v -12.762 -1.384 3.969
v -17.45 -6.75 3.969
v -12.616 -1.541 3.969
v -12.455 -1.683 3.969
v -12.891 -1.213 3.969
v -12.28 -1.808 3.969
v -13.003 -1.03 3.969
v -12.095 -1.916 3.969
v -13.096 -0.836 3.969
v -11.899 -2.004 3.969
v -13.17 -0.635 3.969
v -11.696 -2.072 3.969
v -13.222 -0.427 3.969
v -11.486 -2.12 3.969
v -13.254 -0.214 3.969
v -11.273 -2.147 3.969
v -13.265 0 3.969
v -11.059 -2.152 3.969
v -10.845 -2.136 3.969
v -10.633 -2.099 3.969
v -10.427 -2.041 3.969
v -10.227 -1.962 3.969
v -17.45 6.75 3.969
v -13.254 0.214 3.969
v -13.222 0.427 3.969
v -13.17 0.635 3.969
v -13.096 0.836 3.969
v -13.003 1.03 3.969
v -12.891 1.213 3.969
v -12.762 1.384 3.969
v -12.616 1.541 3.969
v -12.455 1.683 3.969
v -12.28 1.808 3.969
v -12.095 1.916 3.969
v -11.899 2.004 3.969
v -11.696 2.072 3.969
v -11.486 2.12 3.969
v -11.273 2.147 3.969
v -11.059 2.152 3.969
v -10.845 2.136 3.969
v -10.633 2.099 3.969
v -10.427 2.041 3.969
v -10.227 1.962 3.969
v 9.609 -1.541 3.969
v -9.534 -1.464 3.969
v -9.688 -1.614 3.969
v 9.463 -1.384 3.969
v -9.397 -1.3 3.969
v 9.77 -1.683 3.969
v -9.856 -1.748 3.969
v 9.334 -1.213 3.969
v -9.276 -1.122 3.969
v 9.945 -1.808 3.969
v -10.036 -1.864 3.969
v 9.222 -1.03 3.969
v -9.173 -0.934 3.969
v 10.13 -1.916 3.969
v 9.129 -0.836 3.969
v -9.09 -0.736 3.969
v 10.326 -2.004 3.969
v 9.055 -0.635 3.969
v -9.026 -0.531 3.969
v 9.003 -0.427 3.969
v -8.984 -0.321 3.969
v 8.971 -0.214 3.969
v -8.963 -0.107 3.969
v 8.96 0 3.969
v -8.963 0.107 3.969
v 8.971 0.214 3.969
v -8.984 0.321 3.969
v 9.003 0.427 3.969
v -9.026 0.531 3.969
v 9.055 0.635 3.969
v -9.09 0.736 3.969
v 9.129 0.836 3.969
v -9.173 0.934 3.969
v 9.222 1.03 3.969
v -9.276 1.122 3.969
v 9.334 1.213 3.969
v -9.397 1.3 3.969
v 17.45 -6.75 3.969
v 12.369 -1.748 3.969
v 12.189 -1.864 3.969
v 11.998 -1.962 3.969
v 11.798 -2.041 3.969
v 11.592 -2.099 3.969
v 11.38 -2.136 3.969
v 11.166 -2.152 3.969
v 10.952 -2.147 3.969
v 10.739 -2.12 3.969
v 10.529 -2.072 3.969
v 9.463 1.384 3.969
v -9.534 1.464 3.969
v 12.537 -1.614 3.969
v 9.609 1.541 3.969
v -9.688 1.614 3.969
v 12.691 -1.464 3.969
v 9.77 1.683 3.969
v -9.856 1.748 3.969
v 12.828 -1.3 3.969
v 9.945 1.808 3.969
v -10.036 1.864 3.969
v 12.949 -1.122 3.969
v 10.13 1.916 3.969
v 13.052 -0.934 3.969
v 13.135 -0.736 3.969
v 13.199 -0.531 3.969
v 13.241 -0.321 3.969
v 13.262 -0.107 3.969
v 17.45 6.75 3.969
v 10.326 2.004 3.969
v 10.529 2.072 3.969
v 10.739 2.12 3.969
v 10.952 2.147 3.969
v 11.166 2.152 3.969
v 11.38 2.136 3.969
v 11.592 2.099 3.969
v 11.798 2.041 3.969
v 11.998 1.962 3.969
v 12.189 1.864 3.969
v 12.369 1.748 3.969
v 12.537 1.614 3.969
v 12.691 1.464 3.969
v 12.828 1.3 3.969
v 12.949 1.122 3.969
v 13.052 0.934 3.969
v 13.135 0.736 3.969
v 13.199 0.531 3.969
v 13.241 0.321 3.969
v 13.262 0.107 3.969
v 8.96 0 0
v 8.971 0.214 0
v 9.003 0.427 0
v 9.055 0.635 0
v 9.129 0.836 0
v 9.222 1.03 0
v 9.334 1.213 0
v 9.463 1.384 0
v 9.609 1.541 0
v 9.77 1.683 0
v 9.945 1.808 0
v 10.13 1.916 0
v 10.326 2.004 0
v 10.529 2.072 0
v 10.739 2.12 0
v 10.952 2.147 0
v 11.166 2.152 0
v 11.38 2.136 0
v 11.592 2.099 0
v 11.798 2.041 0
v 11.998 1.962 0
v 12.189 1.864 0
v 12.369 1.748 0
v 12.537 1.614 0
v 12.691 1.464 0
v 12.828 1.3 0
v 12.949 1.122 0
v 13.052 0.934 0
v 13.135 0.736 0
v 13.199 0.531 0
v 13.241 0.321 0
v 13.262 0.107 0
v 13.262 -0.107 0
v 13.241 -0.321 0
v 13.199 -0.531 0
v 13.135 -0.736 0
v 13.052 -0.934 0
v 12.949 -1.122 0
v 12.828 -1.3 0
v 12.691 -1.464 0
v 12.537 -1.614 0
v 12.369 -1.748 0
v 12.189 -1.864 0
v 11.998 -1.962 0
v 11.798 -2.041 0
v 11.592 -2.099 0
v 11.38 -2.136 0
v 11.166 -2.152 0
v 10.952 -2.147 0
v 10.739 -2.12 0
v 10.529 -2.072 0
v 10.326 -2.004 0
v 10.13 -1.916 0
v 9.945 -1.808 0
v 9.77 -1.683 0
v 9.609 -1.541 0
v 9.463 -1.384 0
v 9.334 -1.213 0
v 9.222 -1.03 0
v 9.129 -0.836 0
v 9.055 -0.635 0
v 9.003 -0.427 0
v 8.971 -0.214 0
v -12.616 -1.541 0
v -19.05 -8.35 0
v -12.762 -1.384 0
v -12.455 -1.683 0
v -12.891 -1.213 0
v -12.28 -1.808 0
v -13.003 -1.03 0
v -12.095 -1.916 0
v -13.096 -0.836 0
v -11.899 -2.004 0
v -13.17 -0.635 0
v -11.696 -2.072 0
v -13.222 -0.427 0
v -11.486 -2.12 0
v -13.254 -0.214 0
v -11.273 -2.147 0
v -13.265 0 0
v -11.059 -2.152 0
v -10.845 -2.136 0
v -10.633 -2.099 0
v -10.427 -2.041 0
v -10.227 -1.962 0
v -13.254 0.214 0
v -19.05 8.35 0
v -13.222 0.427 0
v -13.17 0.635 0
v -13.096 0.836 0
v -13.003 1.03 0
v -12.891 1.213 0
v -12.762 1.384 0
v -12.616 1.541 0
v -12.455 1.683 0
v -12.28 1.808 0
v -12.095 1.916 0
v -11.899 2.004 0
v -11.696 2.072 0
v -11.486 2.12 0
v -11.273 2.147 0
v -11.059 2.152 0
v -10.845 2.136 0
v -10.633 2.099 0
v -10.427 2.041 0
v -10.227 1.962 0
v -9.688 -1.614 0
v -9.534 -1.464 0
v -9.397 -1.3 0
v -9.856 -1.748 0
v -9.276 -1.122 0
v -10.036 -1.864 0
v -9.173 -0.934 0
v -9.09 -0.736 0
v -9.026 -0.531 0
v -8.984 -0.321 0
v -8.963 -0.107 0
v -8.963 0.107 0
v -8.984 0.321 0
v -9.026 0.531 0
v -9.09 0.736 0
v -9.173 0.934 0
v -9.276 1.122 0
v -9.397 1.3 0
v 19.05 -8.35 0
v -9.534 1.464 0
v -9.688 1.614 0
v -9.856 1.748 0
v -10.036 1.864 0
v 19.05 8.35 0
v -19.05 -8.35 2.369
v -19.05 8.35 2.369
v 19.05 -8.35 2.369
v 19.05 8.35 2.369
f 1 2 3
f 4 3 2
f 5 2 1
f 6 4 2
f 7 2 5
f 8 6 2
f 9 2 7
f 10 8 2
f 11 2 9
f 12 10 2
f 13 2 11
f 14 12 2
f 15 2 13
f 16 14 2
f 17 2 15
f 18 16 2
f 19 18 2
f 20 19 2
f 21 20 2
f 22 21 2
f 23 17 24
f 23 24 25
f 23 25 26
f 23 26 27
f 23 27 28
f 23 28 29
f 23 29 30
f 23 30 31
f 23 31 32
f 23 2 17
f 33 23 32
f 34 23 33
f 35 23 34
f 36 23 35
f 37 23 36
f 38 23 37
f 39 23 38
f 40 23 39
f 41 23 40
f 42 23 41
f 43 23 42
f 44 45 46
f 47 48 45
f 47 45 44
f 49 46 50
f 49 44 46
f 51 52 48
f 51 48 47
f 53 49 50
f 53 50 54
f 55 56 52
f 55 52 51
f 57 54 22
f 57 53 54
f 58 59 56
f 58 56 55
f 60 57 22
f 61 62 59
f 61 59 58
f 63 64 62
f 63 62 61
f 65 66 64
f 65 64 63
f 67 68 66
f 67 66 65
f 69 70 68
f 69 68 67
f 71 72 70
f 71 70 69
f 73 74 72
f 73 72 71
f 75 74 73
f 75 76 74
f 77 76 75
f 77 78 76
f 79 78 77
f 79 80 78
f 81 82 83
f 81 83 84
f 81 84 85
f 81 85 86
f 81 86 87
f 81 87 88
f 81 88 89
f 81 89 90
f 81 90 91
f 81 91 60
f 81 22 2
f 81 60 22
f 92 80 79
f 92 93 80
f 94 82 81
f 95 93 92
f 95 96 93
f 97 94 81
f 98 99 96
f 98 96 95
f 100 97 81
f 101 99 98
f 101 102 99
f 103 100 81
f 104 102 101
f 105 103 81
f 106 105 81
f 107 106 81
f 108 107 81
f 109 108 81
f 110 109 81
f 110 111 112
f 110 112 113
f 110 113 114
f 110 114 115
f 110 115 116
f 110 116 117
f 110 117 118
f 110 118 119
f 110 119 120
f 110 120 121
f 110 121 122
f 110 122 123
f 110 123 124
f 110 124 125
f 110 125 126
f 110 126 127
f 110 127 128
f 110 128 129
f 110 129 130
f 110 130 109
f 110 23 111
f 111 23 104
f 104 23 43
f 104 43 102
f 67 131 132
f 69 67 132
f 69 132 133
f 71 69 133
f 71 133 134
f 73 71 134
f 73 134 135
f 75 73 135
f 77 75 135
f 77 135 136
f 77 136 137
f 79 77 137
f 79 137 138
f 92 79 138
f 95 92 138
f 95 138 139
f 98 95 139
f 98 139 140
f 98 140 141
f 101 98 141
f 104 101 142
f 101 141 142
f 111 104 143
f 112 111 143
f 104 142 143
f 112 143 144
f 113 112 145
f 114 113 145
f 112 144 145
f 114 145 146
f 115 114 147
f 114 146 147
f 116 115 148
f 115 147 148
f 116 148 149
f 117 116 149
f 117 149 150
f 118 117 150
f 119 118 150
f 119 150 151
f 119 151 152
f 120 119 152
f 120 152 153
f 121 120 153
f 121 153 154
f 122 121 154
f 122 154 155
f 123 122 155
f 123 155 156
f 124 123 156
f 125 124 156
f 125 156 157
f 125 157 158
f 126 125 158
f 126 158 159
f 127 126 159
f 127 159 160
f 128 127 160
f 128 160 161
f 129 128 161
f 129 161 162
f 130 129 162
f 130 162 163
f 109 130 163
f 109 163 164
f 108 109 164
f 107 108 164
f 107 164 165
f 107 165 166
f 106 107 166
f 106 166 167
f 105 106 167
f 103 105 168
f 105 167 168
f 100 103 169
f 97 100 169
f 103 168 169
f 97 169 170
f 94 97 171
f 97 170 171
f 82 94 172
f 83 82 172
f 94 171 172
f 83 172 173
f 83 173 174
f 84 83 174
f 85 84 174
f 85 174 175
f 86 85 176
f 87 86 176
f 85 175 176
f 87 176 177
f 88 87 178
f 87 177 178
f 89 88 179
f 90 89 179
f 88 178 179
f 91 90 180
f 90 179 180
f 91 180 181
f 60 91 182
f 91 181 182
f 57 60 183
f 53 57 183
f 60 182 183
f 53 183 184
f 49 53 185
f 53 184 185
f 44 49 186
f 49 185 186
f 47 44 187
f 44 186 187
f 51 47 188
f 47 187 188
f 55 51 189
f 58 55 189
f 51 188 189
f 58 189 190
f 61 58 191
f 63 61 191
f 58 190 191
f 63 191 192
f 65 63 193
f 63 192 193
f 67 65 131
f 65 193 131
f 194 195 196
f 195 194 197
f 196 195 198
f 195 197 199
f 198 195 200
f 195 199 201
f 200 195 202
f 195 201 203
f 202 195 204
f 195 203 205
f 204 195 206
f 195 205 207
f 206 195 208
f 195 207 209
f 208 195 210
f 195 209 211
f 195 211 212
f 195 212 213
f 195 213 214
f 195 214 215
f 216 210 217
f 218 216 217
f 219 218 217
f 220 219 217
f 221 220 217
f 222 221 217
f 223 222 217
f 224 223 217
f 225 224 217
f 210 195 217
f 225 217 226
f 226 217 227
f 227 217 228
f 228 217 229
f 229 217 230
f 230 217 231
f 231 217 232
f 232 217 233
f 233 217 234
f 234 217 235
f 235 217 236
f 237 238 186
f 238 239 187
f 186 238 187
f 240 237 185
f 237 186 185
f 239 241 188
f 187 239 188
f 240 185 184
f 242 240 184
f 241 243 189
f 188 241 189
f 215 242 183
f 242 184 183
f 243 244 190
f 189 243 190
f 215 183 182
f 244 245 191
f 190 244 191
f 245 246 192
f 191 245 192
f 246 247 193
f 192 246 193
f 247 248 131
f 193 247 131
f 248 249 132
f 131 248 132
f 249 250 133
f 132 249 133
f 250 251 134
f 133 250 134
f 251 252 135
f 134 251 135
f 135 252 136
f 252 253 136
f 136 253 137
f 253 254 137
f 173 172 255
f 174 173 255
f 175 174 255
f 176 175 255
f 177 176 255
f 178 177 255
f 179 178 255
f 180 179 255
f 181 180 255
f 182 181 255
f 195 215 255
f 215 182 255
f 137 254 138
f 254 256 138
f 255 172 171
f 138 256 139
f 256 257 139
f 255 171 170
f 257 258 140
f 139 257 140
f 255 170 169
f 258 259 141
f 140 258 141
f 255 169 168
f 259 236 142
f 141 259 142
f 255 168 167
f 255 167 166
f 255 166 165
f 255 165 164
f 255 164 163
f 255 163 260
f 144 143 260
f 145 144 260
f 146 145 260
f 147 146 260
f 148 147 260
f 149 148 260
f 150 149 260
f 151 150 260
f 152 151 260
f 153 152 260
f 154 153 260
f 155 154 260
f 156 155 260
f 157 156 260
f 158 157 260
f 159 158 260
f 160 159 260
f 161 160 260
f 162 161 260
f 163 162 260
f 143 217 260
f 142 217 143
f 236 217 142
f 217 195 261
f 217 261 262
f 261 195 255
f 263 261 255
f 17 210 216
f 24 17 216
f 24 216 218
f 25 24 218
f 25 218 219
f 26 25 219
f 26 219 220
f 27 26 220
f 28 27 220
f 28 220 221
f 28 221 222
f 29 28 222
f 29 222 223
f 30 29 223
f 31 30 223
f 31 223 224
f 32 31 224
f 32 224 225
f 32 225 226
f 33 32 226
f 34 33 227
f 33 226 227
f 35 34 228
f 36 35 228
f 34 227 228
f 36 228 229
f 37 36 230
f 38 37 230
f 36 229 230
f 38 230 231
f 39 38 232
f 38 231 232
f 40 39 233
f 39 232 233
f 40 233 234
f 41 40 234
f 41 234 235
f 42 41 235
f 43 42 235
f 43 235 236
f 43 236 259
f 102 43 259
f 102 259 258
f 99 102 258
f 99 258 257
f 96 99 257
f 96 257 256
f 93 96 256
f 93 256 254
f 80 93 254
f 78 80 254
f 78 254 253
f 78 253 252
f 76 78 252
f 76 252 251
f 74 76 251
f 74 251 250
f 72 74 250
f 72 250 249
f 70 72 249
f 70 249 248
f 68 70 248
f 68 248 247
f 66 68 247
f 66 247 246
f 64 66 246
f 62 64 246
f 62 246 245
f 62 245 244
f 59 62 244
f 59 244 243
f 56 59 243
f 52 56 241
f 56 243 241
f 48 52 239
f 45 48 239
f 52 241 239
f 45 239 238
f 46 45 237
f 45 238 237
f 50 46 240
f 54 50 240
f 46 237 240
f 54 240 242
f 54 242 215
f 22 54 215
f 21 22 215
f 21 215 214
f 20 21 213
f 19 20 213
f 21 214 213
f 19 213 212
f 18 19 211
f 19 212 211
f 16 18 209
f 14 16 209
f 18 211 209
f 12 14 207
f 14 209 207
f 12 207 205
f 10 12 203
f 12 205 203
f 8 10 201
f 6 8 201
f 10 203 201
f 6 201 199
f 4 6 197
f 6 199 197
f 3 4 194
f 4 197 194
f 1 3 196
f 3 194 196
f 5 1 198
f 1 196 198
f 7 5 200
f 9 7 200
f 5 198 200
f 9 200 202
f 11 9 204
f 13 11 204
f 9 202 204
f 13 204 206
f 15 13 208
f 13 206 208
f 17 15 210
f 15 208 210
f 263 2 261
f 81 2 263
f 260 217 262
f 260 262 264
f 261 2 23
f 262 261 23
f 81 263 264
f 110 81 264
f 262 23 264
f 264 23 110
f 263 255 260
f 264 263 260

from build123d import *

# Parameters (mm, degrees)
SKETCH2_W             = 38.1
SKETCH2_H             = 16.7005
BOSS_EXTRUDE1_DEPTH   = 3.96875
F_8_CLEARANCE_HOLE1_D = 4.3053
CHAMFER1_SIZE         = 1.6002


with BuildPart() as part:
    # Sketch2 → Boss-Extrude1 (new body)
    with BuildSketch(Plane.XY):
        Rectangle(SKETCH2_W, SKETCH2_H)
    extrude(amount=BOSS_EXTRUDE1_DEPTH)

    # #8 Clearance Hole1 (through all)
    with Locations(Plane.XY.offset(3.96875)):
        with Locations((-11.1125, 0), (11.1125, 0)):
            Hole(F_8_CLEARANCE_HOLE1_D / 2)

    # Chamfer1
    chamfer1_edges = [part.edges().sort_by_distance(p)[0] for p in [
        (-19.05, 0, 3.96875),
        (0, -8.35025, 3.96875),
        (19.05, 0, 3.96875),
        (0, 8.35025, 3.96875),
    ]]
    chamfer(chamfer1_edges, length=CHAMFER1_SIZE)


solid = part.part
